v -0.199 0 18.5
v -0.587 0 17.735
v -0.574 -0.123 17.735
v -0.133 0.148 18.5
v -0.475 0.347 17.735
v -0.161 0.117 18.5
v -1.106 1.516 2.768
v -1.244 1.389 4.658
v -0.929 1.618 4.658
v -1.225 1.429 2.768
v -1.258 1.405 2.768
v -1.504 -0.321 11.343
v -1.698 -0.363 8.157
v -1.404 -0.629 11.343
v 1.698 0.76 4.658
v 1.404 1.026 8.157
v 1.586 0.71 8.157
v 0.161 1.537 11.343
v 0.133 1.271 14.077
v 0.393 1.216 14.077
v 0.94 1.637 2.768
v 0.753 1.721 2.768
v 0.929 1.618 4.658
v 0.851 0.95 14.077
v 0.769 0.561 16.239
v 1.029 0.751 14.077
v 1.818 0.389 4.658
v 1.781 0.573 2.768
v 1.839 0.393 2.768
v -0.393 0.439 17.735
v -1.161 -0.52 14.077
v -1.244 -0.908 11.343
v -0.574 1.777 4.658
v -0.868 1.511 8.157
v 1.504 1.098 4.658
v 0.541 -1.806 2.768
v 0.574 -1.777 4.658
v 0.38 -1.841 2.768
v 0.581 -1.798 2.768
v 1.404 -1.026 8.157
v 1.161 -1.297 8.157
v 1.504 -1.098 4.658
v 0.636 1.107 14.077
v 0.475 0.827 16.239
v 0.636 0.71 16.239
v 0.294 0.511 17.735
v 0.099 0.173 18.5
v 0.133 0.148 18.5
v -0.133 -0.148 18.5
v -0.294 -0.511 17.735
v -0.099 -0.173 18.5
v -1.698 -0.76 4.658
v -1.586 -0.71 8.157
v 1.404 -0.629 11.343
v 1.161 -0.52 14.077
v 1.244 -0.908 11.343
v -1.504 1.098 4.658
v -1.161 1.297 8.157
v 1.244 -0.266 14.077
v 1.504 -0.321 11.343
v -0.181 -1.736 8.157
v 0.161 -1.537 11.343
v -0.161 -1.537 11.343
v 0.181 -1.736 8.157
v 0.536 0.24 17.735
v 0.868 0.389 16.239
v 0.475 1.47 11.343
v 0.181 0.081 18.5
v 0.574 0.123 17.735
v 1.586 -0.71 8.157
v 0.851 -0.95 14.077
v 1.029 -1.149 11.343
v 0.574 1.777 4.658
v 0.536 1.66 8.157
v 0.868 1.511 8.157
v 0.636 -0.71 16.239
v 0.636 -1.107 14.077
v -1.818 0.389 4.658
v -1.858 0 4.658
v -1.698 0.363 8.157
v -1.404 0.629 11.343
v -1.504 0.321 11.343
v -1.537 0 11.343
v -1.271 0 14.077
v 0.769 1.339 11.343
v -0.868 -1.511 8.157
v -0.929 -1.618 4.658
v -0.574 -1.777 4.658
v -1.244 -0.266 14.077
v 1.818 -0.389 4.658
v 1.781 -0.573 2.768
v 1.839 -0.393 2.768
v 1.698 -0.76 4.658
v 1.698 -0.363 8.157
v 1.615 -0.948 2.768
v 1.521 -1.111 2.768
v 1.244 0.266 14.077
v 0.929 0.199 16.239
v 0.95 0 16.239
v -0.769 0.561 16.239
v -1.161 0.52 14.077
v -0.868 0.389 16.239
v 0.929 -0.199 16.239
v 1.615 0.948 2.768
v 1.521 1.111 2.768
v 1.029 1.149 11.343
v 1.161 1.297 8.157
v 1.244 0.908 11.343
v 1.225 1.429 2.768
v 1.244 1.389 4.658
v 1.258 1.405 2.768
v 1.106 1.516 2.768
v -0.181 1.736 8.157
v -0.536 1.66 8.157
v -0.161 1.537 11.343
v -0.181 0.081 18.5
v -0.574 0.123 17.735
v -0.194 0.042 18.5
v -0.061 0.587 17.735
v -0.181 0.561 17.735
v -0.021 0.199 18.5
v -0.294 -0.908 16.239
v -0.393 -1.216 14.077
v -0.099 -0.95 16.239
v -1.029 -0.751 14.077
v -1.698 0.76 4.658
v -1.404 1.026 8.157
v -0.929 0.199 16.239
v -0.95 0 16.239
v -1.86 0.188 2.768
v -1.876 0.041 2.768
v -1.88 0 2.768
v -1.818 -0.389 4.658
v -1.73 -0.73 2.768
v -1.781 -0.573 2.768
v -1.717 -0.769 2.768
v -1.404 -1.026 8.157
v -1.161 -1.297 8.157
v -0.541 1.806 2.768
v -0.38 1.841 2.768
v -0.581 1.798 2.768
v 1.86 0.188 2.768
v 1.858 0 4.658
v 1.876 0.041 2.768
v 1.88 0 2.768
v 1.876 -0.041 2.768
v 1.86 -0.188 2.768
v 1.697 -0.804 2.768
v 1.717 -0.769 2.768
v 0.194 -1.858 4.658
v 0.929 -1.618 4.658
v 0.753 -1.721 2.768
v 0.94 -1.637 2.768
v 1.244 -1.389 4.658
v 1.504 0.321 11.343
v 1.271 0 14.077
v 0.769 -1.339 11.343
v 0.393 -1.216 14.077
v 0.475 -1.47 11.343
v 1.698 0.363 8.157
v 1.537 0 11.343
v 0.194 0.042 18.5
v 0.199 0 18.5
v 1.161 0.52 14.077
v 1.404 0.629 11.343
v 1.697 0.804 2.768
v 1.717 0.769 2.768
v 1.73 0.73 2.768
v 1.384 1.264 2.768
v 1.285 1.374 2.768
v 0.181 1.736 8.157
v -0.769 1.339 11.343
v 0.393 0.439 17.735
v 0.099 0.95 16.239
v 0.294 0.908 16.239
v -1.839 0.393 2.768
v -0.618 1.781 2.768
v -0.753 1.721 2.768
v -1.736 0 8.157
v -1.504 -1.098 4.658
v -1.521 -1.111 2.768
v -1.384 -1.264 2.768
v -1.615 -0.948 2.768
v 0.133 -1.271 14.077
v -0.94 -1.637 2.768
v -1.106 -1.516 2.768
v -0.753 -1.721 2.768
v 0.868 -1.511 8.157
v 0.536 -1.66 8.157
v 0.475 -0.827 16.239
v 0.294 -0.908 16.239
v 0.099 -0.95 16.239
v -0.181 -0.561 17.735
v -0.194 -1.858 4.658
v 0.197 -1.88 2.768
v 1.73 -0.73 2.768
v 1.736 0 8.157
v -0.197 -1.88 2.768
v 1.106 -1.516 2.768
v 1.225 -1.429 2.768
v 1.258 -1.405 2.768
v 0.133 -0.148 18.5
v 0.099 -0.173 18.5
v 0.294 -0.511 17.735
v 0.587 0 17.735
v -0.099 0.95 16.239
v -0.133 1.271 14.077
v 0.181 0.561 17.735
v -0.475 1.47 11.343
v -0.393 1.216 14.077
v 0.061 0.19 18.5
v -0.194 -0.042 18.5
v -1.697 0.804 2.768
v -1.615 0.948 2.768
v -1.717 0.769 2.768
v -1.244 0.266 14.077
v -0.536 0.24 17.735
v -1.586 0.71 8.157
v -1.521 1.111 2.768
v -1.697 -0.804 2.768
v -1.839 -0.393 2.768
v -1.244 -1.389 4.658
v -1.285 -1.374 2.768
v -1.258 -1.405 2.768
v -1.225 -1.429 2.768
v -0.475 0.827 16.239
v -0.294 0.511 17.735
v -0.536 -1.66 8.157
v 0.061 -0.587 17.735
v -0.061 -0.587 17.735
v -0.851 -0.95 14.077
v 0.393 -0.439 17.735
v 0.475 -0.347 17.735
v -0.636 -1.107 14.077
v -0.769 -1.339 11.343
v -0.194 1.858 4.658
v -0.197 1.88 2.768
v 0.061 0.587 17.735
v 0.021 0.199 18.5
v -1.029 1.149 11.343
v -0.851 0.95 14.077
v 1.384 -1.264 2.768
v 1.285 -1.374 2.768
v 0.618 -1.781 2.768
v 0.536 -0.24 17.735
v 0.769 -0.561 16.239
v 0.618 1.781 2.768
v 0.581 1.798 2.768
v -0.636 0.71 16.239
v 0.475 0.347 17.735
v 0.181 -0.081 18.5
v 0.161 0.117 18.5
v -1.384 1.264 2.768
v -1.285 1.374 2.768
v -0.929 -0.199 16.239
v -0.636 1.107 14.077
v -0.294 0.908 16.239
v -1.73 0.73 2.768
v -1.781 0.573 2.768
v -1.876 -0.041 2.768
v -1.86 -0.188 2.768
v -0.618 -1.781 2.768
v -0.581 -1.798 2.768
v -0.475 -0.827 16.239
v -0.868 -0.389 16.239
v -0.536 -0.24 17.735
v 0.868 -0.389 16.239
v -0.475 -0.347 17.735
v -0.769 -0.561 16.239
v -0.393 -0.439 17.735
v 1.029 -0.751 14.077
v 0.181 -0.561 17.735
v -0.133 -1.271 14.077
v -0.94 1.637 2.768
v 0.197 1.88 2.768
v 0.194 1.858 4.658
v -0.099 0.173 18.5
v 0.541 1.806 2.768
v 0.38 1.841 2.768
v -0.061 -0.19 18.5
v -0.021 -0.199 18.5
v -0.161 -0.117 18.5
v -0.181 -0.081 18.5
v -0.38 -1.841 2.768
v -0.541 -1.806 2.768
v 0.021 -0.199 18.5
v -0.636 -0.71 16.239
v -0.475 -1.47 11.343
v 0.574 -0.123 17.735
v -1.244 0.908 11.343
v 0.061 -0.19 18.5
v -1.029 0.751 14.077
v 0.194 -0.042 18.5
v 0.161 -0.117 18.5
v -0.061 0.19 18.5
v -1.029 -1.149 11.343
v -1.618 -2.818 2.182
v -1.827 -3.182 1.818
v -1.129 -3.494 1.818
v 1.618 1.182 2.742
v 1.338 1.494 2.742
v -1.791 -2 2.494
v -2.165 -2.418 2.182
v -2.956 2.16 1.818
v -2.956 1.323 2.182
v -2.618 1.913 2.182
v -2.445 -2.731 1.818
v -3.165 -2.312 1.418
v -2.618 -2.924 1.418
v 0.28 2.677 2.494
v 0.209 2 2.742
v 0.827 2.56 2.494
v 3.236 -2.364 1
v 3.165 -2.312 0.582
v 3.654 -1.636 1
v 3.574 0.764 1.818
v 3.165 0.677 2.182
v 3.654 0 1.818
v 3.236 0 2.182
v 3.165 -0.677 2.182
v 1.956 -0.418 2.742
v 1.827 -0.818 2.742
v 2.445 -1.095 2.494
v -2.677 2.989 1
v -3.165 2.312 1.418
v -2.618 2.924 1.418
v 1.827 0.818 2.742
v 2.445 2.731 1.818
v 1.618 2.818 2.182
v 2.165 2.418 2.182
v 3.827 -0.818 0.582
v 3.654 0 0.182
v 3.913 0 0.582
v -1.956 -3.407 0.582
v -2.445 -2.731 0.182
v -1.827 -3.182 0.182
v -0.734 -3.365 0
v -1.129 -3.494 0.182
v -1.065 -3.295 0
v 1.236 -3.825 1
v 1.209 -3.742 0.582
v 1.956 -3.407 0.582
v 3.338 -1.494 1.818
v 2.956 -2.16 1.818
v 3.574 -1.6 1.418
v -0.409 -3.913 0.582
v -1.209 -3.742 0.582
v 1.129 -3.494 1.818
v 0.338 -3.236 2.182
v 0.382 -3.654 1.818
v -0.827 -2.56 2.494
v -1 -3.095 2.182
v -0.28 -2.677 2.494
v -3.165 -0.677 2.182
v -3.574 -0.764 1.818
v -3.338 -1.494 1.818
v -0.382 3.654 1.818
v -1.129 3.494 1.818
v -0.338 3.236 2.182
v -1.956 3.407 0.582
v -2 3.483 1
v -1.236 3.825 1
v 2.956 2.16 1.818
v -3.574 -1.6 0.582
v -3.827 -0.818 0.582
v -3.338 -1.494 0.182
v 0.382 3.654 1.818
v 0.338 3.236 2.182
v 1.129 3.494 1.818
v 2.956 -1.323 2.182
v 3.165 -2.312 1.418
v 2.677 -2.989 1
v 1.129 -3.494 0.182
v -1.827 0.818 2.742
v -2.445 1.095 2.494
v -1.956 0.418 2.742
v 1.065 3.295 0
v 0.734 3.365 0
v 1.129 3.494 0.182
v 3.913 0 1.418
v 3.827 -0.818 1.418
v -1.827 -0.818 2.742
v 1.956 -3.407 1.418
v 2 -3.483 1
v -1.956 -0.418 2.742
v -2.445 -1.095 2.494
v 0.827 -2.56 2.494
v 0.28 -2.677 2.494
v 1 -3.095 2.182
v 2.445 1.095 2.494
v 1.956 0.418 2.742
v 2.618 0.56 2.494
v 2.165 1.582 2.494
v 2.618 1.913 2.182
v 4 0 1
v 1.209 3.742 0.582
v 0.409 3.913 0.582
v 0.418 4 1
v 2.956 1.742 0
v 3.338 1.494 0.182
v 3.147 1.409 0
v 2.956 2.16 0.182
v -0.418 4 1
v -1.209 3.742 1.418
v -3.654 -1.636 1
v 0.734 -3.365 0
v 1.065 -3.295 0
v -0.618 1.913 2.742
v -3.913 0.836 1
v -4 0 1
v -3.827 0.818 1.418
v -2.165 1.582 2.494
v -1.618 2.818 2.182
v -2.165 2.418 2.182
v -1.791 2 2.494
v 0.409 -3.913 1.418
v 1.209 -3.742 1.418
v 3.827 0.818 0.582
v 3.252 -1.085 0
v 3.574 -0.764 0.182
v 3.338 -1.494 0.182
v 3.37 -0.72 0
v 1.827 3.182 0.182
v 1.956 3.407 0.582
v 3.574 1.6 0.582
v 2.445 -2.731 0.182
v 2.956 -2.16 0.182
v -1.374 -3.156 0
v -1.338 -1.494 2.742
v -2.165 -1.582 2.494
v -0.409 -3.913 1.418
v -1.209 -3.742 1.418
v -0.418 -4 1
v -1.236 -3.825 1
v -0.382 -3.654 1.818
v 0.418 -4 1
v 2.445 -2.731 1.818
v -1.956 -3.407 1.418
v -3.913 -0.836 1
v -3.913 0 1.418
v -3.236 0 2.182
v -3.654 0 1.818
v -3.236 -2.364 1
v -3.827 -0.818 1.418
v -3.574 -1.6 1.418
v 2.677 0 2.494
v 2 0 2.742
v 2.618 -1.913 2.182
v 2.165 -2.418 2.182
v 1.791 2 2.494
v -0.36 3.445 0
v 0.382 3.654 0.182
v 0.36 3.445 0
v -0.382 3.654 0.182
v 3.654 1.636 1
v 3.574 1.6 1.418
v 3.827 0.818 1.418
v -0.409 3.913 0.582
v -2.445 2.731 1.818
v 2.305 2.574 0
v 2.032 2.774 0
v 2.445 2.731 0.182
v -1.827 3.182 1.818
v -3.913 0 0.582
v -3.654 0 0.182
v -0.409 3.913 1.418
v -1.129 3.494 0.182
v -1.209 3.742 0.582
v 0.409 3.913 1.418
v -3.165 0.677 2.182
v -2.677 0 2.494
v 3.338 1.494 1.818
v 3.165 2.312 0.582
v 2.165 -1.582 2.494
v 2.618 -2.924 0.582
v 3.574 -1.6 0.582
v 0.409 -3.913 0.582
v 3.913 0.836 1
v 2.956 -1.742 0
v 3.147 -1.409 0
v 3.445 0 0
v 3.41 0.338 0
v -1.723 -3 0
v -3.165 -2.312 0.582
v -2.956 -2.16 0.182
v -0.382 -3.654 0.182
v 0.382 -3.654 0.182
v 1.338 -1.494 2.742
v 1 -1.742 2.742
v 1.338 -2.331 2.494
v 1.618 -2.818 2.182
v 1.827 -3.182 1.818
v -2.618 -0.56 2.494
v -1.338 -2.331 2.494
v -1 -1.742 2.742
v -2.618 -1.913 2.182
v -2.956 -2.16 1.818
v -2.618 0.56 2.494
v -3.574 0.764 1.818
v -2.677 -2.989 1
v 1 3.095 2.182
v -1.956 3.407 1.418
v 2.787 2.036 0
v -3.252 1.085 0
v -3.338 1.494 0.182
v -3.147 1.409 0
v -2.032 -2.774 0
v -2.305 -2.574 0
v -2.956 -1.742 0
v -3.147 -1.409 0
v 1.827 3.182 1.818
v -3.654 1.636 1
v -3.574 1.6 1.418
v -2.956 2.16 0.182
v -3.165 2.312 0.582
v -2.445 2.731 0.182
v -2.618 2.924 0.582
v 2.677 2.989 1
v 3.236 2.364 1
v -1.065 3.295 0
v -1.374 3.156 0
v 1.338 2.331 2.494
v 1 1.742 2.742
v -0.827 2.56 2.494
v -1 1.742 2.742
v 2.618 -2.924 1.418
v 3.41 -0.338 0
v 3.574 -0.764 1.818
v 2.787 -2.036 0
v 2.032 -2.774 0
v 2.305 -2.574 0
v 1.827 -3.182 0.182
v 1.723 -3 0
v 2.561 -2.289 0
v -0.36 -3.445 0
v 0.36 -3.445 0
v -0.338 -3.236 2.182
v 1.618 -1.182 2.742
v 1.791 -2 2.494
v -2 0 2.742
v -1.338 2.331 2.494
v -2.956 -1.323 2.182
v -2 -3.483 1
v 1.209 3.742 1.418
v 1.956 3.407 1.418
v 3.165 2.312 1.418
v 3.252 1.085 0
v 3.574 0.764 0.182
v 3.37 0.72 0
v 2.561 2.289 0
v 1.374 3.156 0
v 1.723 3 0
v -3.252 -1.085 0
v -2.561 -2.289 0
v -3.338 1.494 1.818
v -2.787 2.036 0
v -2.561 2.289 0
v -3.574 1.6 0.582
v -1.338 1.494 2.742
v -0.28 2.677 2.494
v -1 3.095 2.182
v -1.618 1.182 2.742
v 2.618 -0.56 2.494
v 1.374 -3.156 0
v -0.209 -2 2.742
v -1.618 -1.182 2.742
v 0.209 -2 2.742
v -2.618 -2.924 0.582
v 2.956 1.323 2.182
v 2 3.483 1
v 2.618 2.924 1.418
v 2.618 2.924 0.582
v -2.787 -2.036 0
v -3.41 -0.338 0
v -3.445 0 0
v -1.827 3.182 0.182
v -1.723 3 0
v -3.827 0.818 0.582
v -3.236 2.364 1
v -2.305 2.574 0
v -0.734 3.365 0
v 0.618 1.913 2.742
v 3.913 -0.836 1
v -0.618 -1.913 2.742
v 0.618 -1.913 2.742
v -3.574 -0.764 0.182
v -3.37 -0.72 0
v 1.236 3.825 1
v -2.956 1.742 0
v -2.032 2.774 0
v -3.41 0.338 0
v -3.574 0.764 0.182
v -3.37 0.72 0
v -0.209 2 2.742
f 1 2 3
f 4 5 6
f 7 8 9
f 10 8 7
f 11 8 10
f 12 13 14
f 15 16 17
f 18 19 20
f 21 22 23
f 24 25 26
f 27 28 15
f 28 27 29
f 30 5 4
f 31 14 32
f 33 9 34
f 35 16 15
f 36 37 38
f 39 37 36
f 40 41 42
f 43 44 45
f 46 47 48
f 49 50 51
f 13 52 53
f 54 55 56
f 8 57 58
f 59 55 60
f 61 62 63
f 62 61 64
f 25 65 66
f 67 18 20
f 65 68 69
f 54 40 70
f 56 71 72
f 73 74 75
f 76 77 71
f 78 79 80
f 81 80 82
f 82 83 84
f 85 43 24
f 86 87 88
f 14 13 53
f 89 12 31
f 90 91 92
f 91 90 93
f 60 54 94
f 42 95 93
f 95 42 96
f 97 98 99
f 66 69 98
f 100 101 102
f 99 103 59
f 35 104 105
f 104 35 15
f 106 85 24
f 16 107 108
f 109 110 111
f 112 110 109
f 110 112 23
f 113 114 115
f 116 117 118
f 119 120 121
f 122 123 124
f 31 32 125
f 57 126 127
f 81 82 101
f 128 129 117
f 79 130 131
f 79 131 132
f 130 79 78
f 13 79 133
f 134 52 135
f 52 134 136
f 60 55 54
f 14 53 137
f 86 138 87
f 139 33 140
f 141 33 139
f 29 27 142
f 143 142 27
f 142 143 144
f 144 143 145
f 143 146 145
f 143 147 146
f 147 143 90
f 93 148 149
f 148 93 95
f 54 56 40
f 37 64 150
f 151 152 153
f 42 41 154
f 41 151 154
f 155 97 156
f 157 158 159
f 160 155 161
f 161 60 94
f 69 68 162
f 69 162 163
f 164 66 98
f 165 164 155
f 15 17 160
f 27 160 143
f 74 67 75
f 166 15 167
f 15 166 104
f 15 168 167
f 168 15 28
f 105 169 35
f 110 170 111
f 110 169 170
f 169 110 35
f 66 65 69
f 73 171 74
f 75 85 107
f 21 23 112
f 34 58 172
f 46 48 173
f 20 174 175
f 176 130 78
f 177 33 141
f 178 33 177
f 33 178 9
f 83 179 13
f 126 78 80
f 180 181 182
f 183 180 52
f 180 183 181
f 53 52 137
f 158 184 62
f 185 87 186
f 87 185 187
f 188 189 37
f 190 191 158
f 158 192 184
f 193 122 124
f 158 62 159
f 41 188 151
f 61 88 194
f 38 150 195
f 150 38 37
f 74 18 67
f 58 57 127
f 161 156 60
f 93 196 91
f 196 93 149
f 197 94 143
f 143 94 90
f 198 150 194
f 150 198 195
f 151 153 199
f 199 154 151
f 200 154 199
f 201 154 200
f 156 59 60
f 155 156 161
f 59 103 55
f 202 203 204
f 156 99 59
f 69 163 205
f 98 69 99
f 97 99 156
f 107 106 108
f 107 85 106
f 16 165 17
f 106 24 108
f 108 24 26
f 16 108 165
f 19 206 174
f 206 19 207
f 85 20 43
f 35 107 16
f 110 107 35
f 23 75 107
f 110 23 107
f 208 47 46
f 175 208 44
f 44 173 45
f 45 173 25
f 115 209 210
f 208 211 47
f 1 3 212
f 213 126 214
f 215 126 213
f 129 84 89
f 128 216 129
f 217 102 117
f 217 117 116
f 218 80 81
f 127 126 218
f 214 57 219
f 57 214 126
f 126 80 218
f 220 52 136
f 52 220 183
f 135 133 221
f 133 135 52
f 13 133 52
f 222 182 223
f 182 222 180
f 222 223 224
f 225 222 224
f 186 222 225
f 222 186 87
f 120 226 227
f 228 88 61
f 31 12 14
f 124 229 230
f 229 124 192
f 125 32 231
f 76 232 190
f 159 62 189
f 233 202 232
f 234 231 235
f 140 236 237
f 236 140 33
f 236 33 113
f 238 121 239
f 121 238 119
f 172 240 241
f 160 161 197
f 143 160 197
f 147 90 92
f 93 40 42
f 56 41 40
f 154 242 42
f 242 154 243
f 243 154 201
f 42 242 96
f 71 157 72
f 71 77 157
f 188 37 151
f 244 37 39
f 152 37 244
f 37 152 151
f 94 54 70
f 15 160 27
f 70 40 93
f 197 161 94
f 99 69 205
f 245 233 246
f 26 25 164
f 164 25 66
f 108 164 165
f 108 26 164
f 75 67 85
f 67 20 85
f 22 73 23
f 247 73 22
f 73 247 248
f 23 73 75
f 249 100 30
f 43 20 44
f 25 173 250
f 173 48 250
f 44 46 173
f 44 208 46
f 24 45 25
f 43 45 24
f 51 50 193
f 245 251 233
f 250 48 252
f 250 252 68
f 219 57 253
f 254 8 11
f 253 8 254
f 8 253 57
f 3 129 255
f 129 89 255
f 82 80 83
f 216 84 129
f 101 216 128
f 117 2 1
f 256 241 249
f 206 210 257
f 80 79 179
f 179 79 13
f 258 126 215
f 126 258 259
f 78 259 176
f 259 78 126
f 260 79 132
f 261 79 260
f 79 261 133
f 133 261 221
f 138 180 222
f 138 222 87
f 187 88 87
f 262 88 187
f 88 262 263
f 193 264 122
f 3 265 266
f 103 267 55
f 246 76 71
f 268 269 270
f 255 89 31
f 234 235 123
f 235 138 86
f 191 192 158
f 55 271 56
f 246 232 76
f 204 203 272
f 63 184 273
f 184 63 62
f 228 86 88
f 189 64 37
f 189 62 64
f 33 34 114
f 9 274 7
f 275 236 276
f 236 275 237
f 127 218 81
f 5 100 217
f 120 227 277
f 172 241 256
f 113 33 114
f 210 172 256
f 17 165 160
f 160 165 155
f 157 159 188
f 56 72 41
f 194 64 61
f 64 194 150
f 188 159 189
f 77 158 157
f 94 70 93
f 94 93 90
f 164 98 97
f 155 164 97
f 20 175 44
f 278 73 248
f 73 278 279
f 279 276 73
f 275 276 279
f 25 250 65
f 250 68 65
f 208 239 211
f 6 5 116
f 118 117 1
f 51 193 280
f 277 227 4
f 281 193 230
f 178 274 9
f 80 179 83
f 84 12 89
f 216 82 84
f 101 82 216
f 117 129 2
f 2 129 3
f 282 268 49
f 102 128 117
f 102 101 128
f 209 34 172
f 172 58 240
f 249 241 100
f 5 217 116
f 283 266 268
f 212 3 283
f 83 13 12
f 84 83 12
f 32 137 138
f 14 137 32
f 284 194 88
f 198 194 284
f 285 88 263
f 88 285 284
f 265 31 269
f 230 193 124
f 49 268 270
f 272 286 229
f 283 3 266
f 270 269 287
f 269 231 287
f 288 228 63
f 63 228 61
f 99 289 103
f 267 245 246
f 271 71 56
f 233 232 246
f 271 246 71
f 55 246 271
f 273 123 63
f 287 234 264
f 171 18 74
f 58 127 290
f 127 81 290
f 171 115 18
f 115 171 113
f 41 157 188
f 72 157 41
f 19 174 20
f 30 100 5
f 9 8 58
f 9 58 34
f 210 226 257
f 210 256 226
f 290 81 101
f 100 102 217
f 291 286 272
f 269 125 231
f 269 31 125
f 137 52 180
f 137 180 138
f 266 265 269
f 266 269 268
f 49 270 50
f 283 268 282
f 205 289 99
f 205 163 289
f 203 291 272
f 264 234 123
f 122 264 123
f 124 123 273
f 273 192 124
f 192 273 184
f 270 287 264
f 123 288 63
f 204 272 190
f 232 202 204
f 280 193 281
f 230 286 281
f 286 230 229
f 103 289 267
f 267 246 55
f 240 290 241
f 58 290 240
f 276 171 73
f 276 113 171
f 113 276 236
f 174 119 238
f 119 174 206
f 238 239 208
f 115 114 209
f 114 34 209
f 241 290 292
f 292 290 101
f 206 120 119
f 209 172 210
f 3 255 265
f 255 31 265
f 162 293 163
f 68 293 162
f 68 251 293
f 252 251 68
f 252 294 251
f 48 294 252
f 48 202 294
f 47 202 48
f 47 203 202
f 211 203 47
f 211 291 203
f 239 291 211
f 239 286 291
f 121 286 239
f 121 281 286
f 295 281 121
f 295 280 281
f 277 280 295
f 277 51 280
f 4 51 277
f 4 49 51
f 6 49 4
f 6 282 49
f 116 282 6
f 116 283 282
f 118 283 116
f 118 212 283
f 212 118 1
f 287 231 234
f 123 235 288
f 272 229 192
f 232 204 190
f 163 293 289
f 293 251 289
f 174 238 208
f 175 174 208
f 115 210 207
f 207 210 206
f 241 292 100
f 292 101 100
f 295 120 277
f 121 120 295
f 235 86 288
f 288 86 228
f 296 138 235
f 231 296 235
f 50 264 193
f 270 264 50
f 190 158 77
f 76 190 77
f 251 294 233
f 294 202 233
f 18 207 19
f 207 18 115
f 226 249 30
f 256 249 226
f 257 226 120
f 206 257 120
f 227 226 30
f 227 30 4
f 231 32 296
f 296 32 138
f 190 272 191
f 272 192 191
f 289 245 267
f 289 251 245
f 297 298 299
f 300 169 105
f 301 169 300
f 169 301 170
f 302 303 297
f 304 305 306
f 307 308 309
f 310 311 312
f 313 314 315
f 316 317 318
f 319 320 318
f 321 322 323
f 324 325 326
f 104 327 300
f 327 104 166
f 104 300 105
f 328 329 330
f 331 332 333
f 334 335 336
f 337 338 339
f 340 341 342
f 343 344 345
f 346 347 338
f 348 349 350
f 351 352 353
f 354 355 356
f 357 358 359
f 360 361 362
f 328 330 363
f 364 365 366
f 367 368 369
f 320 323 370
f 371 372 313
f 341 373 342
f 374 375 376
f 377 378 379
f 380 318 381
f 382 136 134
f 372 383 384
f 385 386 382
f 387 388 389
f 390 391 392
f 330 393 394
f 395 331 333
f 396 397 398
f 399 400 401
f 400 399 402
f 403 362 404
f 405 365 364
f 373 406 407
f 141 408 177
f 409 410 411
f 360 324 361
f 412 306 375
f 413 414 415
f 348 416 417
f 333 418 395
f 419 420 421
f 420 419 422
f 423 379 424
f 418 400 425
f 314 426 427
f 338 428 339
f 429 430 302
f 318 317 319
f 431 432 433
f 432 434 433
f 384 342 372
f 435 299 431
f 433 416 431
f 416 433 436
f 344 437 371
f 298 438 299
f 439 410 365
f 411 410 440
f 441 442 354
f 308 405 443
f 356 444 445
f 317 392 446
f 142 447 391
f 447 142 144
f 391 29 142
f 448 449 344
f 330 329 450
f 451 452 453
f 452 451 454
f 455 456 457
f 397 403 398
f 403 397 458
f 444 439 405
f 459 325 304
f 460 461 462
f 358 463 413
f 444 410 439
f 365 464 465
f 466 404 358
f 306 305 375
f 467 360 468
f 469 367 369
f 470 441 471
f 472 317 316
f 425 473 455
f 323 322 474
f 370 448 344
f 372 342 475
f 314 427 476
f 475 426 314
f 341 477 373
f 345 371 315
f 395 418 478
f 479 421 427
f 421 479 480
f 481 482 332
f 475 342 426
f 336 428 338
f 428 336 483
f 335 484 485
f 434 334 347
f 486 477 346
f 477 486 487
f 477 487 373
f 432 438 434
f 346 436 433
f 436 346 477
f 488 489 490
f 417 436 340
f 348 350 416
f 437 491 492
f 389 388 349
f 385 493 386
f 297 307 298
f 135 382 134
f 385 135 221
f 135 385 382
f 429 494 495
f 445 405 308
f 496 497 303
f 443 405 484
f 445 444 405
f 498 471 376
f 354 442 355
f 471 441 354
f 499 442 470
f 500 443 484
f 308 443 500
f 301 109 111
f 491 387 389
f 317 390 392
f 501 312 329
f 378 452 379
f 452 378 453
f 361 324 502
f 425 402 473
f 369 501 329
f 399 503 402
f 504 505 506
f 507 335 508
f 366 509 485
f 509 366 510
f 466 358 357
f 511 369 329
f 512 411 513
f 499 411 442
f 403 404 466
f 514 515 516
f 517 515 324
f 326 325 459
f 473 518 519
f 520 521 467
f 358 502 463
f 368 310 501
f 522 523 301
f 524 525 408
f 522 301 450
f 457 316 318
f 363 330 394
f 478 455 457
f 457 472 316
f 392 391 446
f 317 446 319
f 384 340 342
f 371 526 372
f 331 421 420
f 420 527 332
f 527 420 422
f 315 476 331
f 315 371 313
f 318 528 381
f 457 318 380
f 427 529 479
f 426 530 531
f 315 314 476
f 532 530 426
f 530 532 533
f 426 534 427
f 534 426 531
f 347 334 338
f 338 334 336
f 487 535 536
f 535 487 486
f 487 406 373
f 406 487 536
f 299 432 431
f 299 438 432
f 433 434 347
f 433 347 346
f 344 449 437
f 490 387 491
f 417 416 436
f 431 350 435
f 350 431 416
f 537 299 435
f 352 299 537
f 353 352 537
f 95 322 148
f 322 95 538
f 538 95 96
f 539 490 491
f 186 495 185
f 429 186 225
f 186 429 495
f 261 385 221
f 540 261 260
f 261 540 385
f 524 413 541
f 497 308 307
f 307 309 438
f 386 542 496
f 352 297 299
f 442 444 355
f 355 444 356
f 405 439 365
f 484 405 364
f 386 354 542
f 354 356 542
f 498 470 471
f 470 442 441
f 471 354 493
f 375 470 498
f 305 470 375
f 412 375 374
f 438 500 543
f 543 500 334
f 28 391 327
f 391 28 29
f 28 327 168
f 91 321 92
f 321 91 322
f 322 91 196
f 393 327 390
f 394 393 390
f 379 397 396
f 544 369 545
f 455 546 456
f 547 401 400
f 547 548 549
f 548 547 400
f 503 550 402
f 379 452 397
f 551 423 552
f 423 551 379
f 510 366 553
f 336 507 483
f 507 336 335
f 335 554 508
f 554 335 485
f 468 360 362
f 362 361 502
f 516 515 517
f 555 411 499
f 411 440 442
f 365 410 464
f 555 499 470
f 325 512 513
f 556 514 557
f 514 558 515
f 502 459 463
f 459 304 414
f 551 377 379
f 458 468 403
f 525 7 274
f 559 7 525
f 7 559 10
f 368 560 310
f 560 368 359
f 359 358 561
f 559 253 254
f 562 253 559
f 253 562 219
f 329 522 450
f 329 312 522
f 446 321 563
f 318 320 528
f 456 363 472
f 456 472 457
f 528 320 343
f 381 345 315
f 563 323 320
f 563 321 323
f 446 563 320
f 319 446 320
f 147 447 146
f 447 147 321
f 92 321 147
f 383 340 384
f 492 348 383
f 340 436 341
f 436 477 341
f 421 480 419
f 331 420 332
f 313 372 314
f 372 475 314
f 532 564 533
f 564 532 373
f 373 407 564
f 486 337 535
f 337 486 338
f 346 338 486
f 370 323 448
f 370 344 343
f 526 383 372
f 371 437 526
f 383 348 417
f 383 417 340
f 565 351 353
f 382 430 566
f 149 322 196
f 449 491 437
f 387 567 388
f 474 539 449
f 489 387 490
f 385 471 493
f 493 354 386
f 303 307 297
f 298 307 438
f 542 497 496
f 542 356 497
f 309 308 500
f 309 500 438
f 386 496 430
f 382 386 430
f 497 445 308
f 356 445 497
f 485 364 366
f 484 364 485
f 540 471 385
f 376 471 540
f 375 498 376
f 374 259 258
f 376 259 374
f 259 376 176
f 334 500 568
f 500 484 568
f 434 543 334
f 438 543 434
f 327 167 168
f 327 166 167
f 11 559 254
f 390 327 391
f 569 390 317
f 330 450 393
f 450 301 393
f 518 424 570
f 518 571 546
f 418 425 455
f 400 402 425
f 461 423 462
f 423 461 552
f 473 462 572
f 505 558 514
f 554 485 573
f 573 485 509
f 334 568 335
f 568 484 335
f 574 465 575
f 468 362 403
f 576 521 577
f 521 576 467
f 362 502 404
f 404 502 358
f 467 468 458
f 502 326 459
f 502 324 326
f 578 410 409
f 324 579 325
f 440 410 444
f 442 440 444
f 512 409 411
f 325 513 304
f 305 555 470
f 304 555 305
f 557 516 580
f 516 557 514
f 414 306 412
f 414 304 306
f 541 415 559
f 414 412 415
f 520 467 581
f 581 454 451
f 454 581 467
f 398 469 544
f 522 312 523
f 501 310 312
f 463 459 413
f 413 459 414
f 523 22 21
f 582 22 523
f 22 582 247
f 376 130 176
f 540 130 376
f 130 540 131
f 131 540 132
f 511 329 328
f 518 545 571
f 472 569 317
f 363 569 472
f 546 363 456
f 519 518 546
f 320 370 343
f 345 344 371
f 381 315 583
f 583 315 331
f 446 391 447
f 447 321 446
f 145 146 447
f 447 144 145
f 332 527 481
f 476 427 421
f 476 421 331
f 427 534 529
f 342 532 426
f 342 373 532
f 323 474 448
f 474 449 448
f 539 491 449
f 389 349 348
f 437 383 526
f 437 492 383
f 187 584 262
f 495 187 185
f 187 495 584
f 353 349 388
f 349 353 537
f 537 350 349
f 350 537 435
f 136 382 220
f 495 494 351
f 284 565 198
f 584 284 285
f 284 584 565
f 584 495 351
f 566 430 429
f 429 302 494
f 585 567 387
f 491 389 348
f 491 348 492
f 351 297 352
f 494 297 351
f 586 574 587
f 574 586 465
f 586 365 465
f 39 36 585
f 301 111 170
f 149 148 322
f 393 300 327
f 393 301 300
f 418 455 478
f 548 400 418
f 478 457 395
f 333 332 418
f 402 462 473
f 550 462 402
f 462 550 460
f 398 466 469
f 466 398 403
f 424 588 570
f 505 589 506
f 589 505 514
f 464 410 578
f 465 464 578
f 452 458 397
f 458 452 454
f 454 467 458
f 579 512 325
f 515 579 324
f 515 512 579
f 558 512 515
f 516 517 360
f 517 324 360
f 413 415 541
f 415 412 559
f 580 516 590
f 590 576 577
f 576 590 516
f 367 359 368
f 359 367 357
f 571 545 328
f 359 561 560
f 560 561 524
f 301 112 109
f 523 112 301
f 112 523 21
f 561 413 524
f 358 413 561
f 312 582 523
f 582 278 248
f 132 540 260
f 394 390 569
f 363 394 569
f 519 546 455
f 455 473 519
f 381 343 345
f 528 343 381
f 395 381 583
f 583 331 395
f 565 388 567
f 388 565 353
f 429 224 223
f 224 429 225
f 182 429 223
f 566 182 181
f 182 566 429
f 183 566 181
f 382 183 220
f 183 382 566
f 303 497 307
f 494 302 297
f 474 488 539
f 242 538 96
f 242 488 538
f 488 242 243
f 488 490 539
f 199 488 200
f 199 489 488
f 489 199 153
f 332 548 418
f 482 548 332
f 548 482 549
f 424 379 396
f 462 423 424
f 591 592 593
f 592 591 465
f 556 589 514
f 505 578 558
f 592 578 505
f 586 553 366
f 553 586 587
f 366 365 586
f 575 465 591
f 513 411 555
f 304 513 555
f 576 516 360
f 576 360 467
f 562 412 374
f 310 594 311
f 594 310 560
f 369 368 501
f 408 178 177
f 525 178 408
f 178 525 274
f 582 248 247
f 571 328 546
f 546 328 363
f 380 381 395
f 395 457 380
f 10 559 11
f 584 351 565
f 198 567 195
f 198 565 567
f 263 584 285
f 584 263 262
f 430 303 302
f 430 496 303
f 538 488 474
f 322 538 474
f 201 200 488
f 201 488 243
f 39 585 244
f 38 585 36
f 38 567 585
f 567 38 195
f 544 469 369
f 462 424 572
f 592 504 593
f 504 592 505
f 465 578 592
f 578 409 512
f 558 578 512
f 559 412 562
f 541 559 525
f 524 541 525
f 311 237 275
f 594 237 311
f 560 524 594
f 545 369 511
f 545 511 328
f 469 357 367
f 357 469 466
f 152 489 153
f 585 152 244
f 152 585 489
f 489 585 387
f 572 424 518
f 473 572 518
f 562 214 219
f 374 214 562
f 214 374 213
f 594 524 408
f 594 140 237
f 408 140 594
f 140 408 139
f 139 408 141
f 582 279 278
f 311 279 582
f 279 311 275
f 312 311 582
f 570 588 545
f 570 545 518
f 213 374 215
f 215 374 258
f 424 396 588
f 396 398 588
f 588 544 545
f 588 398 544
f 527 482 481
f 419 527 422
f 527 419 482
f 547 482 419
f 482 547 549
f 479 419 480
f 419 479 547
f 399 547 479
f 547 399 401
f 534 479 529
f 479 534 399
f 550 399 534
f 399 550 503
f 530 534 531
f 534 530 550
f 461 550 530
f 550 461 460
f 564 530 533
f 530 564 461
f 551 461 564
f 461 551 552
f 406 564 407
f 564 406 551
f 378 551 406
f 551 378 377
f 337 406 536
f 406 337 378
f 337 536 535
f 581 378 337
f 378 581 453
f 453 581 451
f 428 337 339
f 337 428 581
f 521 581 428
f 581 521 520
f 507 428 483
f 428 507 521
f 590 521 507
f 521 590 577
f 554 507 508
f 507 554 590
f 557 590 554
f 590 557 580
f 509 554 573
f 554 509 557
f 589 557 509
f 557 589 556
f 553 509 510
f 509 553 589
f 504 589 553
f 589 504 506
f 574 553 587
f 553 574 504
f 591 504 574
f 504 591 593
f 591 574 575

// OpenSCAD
// The Percostop(TM)
// copyright SJ Hindmarch 2015

difference(){
	translate([0,0,1]){
		//The stem
		resize([3.8,3.8,35])sphere(10);
		//The cap
		resize([8,8,4])sphere(10);
	}
	translate([-4,-4,-18])cube([8,8,18]);
}
